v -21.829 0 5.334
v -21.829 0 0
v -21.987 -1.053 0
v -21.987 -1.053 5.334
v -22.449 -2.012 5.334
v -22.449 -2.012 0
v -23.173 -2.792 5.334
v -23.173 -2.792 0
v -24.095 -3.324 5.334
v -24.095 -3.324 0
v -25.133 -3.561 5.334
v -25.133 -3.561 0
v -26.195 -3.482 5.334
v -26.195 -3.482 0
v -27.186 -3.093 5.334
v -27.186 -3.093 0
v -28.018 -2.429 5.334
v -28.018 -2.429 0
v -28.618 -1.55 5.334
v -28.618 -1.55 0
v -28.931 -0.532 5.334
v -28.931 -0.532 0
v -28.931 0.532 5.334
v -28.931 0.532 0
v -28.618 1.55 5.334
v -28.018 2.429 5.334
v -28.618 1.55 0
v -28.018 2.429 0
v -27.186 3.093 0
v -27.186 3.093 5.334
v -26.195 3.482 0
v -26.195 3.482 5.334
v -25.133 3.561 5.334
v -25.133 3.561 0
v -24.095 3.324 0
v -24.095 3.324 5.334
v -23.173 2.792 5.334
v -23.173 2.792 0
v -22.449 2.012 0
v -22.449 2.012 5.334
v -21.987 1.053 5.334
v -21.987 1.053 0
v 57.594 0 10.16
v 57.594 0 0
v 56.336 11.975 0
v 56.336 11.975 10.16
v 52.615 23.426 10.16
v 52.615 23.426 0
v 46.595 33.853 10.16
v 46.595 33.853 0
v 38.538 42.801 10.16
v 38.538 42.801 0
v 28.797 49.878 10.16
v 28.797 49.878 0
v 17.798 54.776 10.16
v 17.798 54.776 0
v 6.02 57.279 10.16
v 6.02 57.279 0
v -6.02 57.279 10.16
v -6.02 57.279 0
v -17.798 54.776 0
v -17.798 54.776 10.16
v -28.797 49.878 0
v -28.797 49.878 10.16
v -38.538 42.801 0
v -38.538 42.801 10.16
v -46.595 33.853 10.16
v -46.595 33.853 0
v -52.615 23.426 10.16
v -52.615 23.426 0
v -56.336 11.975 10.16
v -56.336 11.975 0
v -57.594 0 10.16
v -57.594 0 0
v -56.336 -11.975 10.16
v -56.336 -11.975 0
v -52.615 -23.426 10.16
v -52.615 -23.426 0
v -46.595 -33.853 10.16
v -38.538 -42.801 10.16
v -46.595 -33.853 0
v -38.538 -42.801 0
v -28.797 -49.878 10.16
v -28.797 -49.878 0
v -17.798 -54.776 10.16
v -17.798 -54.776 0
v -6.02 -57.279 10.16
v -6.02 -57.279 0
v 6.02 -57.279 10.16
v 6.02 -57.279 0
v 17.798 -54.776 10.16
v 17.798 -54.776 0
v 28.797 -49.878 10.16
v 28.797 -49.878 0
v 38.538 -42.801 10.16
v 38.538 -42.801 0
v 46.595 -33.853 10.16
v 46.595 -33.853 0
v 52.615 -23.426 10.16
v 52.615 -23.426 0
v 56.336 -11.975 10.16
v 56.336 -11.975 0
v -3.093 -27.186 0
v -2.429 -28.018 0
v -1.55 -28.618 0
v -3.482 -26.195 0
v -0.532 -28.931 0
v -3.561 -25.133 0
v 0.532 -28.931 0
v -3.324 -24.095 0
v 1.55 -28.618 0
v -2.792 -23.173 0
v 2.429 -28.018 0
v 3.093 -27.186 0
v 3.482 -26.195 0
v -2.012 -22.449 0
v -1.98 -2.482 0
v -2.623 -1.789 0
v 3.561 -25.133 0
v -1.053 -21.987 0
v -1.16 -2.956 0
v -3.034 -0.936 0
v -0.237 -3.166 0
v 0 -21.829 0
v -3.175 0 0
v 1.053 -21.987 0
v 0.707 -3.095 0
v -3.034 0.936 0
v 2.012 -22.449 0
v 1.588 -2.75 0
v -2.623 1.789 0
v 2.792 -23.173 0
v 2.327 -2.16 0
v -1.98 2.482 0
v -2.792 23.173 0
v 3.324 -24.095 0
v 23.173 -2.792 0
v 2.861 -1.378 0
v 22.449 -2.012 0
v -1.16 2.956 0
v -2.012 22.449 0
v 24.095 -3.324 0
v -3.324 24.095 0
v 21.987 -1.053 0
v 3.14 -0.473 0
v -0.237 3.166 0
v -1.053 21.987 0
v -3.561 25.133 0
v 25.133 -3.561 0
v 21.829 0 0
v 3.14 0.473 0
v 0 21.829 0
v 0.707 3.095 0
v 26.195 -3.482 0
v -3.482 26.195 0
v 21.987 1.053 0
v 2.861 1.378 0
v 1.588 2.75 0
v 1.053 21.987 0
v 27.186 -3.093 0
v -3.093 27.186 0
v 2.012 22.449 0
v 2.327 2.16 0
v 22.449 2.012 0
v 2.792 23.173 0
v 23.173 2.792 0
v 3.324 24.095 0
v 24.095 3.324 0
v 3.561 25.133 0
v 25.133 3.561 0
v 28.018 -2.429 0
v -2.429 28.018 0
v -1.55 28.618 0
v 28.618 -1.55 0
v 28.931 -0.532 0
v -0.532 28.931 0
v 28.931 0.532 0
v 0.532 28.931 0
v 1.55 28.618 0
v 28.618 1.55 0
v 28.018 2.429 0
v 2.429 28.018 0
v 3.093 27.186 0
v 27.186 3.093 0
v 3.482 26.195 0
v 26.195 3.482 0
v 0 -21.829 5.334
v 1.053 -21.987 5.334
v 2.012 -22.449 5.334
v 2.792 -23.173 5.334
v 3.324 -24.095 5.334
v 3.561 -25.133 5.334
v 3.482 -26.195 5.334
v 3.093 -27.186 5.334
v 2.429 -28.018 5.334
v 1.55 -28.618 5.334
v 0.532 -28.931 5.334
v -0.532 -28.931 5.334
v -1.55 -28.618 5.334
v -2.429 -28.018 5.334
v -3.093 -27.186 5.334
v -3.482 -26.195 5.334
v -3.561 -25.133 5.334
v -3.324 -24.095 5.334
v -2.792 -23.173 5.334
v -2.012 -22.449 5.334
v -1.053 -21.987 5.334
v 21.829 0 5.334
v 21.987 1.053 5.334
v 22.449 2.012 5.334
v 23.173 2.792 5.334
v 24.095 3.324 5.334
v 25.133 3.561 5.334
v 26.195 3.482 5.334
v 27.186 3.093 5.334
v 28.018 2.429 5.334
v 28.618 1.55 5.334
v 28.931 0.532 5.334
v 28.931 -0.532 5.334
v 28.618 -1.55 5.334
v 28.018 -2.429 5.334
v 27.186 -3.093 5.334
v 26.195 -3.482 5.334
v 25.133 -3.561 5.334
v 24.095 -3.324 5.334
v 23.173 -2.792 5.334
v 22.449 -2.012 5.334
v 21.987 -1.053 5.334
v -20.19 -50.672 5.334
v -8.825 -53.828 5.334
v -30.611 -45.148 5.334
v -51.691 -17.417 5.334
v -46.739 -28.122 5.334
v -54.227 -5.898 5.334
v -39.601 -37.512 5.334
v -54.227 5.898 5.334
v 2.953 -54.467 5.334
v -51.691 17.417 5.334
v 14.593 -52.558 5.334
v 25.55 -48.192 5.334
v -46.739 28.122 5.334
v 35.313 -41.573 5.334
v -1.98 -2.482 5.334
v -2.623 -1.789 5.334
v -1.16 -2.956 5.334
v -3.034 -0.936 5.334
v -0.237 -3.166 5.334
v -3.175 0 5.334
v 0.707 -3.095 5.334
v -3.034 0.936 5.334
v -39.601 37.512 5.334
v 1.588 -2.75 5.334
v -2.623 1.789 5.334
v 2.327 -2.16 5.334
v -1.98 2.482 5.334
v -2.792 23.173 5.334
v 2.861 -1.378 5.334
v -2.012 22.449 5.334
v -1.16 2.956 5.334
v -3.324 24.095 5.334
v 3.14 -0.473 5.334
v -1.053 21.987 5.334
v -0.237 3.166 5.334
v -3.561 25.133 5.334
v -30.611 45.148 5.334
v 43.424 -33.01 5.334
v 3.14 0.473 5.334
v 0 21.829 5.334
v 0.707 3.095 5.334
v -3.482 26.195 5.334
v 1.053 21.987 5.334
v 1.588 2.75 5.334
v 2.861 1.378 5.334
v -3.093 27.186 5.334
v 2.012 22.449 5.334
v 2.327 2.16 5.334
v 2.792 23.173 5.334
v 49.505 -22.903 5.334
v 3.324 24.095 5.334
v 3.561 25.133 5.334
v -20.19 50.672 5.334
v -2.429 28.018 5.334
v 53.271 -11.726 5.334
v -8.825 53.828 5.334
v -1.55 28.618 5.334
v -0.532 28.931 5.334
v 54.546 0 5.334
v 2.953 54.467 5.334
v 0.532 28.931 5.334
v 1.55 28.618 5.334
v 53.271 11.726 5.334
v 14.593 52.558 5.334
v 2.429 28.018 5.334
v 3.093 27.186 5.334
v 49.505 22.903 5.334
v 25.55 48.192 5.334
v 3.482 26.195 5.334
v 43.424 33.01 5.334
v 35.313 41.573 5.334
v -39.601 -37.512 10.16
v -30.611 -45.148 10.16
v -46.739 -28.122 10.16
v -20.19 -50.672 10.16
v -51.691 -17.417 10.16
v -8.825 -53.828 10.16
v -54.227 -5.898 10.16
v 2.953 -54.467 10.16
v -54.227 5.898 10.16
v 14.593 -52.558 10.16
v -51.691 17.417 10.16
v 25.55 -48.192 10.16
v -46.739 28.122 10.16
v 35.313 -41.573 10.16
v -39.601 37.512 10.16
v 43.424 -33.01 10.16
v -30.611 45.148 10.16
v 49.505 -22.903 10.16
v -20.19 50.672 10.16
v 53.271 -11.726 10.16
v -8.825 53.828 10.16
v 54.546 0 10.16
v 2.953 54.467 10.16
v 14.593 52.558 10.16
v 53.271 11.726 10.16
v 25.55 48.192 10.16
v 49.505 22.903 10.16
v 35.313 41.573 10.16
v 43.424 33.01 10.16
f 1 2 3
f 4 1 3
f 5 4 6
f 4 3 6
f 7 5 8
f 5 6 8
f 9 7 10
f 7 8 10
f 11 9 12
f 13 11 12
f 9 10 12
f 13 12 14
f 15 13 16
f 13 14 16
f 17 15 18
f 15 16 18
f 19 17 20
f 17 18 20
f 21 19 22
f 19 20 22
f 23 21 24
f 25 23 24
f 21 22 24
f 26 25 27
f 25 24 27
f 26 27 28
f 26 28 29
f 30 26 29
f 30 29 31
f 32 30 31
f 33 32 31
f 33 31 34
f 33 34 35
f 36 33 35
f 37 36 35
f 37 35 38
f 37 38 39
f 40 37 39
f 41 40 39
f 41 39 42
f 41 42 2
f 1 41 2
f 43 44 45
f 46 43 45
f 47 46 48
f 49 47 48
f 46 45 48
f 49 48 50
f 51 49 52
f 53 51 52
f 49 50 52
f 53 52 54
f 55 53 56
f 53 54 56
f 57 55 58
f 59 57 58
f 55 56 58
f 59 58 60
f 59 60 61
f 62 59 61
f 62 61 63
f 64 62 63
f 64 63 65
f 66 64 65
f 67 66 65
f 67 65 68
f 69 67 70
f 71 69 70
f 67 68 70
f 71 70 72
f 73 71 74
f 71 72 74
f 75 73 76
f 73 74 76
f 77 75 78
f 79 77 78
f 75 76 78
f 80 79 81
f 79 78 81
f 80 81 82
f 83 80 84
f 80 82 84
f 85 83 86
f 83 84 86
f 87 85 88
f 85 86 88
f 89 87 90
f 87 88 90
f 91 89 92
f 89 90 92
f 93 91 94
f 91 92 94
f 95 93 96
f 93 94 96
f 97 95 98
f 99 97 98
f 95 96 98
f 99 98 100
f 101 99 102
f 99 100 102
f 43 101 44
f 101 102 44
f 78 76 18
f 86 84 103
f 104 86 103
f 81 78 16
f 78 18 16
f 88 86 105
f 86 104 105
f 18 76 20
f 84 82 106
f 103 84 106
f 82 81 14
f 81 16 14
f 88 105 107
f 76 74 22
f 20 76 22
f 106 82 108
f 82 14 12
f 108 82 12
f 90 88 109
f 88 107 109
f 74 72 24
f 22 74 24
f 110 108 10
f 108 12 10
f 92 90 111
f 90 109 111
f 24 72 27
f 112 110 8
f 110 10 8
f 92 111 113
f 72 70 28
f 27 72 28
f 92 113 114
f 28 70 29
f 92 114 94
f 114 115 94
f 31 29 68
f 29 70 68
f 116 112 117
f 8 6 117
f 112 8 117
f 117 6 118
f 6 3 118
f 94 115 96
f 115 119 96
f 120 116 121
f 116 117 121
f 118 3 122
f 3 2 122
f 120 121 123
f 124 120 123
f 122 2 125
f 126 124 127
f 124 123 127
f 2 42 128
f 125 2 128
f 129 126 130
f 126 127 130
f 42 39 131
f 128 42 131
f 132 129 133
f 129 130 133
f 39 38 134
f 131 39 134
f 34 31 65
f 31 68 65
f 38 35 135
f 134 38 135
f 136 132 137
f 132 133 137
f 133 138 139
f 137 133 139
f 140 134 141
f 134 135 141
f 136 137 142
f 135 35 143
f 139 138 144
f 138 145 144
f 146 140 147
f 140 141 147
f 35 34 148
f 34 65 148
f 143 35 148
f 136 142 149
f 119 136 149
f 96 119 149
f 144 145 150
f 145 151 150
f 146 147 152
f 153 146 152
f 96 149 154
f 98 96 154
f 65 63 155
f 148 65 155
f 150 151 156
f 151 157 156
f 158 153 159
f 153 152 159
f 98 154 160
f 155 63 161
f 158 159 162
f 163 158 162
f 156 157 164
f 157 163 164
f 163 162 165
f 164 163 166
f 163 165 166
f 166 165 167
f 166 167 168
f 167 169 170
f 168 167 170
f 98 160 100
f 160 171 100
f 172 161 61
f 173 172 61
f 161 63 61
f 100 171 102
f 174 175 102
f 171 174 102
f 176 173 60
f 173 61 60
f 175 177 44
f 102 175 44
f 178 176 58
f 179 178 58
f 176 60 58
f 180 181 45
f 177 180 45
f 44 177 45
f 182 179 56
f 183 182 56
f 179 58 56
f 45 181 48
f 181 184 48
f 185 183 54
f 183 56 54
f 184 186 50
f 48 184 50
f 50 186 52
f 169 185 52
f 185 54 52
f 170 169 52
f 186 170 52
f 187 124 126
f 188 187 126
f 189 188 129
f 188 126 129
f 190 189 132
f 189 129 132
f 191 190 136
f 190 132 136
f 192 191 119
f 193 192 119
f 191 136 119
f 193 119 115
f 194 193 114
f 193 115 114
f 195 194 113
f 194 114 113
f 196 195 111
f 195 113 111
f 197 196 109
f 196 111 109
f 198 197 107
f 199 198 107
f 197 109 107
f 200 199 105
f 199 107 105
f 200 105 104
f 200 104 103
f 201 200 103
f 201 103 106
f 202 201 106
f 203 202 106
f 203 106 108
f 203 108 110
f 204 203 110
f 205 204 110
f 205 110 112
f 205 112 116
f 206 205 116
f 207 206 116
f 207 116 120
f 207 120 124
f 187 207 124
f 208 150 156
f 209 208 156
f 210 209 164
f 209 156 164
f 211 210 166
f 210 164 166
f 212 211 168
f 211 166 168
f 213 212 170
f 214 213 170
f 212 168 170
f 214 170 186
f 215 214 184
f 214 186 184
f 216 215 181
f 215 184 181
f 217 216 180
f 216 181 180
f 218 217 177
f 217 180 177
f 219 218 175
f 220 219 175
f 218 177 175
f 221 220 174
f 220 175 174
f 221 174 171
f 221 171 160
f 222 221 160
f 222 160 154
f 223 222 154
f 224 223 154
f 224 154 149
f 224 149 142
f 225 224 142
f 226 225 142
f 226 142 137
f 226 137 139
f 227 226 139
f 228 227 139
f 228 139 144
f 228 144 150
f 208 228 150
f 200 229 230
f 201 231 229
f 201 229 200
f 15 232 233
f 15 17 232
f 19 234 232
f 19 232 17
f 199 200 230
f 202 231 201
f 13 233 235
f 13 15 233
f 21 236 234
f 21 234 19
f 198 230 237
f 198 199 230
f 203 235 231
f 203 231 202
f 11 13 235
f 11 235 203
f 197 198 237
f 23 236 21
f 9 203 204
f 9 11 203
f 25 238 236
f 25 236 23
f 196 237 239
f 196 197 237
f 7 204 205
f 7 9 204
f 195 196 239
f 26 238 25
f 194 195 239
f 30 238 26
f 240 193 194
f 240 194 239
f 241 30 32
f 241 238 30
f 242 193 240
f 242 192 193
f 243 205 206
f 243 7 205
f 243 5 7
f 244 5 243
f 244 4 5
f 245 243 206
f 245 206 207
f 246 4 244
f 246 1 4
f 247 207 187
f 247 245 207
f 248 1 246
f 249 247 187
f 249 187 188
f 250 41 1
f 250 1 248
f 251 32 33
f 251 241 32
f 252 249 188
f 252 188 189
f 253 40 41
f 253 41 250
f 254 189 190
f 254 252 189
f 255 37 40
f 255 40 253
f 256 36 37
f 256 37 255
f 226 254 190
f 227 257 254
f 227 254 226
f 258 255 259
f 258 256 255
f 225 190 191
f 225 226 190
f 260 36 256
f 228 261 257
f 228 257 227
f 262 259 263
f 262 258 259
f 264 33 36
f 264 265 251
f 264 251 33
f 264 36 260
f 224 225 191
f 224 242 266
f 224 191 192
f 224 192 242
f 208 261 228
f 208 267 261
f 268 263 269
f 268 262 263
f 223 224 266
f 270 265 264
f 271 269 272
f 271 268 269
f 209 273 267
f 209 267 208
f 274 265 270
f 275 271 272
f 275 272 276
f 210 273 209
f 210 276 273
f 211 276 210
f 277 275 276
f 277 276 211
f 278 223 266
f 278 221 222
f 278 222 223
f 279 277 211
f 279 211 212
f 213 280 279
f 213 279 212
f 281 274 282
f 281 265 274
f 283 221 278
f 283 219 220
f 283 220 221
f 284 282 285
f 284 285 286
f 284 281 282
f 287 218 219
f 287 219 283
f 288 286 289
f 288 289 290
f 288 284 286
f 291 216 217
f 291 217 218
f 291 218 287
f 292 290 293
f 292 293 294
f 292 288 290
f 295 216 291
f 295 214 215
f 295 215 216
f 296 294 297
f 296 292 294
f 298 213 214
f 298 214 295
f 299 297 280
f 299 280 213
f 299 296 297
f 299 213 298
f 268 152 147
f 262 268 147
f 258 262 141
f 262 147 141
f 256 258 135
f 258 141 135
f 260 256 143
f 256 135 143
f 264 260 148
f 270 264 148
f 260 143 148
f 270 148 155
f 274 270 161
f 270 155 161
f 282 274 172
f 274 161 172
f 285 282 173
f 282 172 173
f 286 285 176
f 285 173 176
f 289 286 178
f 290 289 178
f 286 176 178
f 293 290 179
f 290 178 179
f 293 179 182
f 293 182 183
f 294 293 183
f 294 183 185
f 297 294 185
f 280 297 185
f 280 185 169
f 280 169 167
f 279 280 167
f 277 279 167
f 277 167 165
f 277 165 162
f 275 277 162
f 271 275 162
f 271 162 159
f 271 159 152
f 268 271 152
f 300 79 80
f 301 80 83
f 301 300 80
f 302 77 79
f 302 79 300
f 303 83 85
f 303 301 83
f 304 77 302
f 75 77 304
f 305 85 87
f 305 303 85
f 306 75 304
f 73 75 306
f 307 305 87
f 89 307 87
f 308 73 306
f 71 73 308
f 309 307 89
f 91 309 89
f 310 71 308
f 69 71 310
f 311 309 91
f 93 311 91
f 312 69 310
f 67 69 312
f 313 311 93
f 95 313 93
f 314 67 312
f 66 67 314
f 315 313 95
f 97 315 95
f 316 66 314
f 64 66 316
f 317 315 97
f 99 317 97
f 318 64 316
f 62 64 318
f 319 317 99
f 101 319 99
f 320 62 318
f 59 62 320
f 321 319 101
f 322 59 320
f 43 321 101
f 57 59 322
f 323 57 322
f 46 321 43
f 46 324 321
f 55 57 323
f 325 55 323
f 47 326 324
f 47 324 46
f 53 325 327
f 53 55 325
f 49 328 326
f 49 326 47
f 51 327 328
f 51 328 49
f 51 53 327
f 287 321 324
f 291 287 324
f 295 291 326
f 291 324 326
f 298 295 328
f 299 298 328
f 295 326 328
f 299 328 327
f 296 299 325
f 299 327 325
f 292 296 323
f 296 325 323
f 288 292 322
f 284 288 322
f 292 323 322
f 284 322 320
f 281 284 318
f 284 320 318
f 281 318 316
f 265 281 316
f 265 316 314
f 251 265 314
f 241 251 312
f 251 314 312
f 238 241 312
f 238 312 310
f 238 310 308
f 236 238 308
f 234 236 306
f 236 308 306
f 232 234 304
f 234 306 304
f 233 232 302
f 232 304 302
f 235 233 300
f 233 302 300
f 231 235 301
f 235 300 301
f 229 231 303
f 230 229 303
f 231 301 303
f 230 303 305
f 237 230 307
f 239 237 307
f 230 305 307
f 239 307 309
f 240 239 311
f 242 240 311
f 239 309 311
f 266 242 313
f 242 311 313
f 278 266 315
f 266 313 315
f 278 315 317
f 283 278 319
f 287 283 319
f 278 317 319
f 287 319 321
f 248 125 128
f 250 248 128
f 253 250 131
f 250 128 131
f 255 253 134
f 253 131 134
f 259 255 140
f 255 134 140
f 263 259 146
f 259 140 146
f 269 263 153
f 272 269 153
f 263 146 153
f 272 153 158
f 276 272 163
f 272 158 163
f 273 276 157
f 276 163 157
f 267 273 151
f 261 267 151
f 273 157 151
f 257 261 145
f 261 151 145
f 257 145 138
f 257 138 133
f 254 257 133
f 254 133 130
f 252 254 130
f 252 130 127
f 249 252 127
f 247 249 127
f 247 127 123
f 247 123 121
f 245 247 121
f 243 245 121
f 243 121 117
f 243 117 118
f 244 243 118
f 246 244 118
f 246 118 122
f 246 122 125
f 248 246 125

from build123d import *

# Parameters (mm, degrees)
SKETCH1_R                       = 57.5945
EXTRUDE1_DEPTH                  = 10.16
SKETCH2_R                       = 54.5465
EXTRUDE2_DEPTH                  = 4.826
F_1_4_0_25_DIAMETER_HOLE1_D     = 6.35
F_1_4_0_25_DIAMETER_HOLE1_DEPTH = 6.35
F_1_4_0_25_DIAMETER_HOLE1_TIP   = 1.907732465
F_1_4_CLEARANCE_HOLE1_D         = 7.14248
CIRPATTERN1_COUNT               = 4


with BuildPart() as part:
    # Sketch1 → Extrude1 (new body)
    with BuildSketch(Plane.XY):
        Circle(SKETCH1_R)
    extrude(amount=EXTRUDE1_DEPTH)

    # Sketch2 → Extrude2 (cut)
    with BuildSketch(Plane.XY.offset(10.16)):
        Circle(SKETCH2_R)
    extrude(amount=-EXTRUDE2_DEPTH, mode=Mode.SUBTRACT)

    # 1/4 (0.25) Diameter Hole1
    with Locations(Plane.XY.offset(5.334)):
        with Locations((0, 0)):
            Hole(F_1_4_0_25_DIAMETER_HOLE1_D / 2, depth=F_1_4_0_25_DIAMETER_HOLE1_DEPTH)
            with Locations((0, 0, -(F_1_4_0_25_DIAMETER_HOLE1_DEPTH + F_1_4_0_25_DIAMETER_HOLE1_TIP / 2))):  # 118° drill point
                Cone(0, F_1_4_0_25_DIAMETER_HOLE1_D / 2, F_1_4_0_25_DIAMETER_HOLE1_TIP, mode=Mode.SUBTRACT)

    # 1/4 Clearance Hole1 (through all)
    with Locations(Plane(origin=(25.4, 0, 5.334), x_dir=(1, 0, 0), z_dir=(0, 0, 1))):
        with Locations((0, 0)):
            f_1_4_clearance_hole1 = Hole(F_1_4_CLEARANCE_HOLE1_D / 2)

    # CirPattern1: 1/4 Clearance Hole1 ×4 about axis
    cirpattern1_axis = Axis((0, 0, 0), (0, 0, 1))
    for i in range(1, CIRPATTERN1_COUNT):
        add(f_1_4_clearance_hole1.rotate(cirpattern1_axis, i * 360 / CIRPATTERN1_COUNT), mode=Mode.SUBTRACT)


solid = part.part
